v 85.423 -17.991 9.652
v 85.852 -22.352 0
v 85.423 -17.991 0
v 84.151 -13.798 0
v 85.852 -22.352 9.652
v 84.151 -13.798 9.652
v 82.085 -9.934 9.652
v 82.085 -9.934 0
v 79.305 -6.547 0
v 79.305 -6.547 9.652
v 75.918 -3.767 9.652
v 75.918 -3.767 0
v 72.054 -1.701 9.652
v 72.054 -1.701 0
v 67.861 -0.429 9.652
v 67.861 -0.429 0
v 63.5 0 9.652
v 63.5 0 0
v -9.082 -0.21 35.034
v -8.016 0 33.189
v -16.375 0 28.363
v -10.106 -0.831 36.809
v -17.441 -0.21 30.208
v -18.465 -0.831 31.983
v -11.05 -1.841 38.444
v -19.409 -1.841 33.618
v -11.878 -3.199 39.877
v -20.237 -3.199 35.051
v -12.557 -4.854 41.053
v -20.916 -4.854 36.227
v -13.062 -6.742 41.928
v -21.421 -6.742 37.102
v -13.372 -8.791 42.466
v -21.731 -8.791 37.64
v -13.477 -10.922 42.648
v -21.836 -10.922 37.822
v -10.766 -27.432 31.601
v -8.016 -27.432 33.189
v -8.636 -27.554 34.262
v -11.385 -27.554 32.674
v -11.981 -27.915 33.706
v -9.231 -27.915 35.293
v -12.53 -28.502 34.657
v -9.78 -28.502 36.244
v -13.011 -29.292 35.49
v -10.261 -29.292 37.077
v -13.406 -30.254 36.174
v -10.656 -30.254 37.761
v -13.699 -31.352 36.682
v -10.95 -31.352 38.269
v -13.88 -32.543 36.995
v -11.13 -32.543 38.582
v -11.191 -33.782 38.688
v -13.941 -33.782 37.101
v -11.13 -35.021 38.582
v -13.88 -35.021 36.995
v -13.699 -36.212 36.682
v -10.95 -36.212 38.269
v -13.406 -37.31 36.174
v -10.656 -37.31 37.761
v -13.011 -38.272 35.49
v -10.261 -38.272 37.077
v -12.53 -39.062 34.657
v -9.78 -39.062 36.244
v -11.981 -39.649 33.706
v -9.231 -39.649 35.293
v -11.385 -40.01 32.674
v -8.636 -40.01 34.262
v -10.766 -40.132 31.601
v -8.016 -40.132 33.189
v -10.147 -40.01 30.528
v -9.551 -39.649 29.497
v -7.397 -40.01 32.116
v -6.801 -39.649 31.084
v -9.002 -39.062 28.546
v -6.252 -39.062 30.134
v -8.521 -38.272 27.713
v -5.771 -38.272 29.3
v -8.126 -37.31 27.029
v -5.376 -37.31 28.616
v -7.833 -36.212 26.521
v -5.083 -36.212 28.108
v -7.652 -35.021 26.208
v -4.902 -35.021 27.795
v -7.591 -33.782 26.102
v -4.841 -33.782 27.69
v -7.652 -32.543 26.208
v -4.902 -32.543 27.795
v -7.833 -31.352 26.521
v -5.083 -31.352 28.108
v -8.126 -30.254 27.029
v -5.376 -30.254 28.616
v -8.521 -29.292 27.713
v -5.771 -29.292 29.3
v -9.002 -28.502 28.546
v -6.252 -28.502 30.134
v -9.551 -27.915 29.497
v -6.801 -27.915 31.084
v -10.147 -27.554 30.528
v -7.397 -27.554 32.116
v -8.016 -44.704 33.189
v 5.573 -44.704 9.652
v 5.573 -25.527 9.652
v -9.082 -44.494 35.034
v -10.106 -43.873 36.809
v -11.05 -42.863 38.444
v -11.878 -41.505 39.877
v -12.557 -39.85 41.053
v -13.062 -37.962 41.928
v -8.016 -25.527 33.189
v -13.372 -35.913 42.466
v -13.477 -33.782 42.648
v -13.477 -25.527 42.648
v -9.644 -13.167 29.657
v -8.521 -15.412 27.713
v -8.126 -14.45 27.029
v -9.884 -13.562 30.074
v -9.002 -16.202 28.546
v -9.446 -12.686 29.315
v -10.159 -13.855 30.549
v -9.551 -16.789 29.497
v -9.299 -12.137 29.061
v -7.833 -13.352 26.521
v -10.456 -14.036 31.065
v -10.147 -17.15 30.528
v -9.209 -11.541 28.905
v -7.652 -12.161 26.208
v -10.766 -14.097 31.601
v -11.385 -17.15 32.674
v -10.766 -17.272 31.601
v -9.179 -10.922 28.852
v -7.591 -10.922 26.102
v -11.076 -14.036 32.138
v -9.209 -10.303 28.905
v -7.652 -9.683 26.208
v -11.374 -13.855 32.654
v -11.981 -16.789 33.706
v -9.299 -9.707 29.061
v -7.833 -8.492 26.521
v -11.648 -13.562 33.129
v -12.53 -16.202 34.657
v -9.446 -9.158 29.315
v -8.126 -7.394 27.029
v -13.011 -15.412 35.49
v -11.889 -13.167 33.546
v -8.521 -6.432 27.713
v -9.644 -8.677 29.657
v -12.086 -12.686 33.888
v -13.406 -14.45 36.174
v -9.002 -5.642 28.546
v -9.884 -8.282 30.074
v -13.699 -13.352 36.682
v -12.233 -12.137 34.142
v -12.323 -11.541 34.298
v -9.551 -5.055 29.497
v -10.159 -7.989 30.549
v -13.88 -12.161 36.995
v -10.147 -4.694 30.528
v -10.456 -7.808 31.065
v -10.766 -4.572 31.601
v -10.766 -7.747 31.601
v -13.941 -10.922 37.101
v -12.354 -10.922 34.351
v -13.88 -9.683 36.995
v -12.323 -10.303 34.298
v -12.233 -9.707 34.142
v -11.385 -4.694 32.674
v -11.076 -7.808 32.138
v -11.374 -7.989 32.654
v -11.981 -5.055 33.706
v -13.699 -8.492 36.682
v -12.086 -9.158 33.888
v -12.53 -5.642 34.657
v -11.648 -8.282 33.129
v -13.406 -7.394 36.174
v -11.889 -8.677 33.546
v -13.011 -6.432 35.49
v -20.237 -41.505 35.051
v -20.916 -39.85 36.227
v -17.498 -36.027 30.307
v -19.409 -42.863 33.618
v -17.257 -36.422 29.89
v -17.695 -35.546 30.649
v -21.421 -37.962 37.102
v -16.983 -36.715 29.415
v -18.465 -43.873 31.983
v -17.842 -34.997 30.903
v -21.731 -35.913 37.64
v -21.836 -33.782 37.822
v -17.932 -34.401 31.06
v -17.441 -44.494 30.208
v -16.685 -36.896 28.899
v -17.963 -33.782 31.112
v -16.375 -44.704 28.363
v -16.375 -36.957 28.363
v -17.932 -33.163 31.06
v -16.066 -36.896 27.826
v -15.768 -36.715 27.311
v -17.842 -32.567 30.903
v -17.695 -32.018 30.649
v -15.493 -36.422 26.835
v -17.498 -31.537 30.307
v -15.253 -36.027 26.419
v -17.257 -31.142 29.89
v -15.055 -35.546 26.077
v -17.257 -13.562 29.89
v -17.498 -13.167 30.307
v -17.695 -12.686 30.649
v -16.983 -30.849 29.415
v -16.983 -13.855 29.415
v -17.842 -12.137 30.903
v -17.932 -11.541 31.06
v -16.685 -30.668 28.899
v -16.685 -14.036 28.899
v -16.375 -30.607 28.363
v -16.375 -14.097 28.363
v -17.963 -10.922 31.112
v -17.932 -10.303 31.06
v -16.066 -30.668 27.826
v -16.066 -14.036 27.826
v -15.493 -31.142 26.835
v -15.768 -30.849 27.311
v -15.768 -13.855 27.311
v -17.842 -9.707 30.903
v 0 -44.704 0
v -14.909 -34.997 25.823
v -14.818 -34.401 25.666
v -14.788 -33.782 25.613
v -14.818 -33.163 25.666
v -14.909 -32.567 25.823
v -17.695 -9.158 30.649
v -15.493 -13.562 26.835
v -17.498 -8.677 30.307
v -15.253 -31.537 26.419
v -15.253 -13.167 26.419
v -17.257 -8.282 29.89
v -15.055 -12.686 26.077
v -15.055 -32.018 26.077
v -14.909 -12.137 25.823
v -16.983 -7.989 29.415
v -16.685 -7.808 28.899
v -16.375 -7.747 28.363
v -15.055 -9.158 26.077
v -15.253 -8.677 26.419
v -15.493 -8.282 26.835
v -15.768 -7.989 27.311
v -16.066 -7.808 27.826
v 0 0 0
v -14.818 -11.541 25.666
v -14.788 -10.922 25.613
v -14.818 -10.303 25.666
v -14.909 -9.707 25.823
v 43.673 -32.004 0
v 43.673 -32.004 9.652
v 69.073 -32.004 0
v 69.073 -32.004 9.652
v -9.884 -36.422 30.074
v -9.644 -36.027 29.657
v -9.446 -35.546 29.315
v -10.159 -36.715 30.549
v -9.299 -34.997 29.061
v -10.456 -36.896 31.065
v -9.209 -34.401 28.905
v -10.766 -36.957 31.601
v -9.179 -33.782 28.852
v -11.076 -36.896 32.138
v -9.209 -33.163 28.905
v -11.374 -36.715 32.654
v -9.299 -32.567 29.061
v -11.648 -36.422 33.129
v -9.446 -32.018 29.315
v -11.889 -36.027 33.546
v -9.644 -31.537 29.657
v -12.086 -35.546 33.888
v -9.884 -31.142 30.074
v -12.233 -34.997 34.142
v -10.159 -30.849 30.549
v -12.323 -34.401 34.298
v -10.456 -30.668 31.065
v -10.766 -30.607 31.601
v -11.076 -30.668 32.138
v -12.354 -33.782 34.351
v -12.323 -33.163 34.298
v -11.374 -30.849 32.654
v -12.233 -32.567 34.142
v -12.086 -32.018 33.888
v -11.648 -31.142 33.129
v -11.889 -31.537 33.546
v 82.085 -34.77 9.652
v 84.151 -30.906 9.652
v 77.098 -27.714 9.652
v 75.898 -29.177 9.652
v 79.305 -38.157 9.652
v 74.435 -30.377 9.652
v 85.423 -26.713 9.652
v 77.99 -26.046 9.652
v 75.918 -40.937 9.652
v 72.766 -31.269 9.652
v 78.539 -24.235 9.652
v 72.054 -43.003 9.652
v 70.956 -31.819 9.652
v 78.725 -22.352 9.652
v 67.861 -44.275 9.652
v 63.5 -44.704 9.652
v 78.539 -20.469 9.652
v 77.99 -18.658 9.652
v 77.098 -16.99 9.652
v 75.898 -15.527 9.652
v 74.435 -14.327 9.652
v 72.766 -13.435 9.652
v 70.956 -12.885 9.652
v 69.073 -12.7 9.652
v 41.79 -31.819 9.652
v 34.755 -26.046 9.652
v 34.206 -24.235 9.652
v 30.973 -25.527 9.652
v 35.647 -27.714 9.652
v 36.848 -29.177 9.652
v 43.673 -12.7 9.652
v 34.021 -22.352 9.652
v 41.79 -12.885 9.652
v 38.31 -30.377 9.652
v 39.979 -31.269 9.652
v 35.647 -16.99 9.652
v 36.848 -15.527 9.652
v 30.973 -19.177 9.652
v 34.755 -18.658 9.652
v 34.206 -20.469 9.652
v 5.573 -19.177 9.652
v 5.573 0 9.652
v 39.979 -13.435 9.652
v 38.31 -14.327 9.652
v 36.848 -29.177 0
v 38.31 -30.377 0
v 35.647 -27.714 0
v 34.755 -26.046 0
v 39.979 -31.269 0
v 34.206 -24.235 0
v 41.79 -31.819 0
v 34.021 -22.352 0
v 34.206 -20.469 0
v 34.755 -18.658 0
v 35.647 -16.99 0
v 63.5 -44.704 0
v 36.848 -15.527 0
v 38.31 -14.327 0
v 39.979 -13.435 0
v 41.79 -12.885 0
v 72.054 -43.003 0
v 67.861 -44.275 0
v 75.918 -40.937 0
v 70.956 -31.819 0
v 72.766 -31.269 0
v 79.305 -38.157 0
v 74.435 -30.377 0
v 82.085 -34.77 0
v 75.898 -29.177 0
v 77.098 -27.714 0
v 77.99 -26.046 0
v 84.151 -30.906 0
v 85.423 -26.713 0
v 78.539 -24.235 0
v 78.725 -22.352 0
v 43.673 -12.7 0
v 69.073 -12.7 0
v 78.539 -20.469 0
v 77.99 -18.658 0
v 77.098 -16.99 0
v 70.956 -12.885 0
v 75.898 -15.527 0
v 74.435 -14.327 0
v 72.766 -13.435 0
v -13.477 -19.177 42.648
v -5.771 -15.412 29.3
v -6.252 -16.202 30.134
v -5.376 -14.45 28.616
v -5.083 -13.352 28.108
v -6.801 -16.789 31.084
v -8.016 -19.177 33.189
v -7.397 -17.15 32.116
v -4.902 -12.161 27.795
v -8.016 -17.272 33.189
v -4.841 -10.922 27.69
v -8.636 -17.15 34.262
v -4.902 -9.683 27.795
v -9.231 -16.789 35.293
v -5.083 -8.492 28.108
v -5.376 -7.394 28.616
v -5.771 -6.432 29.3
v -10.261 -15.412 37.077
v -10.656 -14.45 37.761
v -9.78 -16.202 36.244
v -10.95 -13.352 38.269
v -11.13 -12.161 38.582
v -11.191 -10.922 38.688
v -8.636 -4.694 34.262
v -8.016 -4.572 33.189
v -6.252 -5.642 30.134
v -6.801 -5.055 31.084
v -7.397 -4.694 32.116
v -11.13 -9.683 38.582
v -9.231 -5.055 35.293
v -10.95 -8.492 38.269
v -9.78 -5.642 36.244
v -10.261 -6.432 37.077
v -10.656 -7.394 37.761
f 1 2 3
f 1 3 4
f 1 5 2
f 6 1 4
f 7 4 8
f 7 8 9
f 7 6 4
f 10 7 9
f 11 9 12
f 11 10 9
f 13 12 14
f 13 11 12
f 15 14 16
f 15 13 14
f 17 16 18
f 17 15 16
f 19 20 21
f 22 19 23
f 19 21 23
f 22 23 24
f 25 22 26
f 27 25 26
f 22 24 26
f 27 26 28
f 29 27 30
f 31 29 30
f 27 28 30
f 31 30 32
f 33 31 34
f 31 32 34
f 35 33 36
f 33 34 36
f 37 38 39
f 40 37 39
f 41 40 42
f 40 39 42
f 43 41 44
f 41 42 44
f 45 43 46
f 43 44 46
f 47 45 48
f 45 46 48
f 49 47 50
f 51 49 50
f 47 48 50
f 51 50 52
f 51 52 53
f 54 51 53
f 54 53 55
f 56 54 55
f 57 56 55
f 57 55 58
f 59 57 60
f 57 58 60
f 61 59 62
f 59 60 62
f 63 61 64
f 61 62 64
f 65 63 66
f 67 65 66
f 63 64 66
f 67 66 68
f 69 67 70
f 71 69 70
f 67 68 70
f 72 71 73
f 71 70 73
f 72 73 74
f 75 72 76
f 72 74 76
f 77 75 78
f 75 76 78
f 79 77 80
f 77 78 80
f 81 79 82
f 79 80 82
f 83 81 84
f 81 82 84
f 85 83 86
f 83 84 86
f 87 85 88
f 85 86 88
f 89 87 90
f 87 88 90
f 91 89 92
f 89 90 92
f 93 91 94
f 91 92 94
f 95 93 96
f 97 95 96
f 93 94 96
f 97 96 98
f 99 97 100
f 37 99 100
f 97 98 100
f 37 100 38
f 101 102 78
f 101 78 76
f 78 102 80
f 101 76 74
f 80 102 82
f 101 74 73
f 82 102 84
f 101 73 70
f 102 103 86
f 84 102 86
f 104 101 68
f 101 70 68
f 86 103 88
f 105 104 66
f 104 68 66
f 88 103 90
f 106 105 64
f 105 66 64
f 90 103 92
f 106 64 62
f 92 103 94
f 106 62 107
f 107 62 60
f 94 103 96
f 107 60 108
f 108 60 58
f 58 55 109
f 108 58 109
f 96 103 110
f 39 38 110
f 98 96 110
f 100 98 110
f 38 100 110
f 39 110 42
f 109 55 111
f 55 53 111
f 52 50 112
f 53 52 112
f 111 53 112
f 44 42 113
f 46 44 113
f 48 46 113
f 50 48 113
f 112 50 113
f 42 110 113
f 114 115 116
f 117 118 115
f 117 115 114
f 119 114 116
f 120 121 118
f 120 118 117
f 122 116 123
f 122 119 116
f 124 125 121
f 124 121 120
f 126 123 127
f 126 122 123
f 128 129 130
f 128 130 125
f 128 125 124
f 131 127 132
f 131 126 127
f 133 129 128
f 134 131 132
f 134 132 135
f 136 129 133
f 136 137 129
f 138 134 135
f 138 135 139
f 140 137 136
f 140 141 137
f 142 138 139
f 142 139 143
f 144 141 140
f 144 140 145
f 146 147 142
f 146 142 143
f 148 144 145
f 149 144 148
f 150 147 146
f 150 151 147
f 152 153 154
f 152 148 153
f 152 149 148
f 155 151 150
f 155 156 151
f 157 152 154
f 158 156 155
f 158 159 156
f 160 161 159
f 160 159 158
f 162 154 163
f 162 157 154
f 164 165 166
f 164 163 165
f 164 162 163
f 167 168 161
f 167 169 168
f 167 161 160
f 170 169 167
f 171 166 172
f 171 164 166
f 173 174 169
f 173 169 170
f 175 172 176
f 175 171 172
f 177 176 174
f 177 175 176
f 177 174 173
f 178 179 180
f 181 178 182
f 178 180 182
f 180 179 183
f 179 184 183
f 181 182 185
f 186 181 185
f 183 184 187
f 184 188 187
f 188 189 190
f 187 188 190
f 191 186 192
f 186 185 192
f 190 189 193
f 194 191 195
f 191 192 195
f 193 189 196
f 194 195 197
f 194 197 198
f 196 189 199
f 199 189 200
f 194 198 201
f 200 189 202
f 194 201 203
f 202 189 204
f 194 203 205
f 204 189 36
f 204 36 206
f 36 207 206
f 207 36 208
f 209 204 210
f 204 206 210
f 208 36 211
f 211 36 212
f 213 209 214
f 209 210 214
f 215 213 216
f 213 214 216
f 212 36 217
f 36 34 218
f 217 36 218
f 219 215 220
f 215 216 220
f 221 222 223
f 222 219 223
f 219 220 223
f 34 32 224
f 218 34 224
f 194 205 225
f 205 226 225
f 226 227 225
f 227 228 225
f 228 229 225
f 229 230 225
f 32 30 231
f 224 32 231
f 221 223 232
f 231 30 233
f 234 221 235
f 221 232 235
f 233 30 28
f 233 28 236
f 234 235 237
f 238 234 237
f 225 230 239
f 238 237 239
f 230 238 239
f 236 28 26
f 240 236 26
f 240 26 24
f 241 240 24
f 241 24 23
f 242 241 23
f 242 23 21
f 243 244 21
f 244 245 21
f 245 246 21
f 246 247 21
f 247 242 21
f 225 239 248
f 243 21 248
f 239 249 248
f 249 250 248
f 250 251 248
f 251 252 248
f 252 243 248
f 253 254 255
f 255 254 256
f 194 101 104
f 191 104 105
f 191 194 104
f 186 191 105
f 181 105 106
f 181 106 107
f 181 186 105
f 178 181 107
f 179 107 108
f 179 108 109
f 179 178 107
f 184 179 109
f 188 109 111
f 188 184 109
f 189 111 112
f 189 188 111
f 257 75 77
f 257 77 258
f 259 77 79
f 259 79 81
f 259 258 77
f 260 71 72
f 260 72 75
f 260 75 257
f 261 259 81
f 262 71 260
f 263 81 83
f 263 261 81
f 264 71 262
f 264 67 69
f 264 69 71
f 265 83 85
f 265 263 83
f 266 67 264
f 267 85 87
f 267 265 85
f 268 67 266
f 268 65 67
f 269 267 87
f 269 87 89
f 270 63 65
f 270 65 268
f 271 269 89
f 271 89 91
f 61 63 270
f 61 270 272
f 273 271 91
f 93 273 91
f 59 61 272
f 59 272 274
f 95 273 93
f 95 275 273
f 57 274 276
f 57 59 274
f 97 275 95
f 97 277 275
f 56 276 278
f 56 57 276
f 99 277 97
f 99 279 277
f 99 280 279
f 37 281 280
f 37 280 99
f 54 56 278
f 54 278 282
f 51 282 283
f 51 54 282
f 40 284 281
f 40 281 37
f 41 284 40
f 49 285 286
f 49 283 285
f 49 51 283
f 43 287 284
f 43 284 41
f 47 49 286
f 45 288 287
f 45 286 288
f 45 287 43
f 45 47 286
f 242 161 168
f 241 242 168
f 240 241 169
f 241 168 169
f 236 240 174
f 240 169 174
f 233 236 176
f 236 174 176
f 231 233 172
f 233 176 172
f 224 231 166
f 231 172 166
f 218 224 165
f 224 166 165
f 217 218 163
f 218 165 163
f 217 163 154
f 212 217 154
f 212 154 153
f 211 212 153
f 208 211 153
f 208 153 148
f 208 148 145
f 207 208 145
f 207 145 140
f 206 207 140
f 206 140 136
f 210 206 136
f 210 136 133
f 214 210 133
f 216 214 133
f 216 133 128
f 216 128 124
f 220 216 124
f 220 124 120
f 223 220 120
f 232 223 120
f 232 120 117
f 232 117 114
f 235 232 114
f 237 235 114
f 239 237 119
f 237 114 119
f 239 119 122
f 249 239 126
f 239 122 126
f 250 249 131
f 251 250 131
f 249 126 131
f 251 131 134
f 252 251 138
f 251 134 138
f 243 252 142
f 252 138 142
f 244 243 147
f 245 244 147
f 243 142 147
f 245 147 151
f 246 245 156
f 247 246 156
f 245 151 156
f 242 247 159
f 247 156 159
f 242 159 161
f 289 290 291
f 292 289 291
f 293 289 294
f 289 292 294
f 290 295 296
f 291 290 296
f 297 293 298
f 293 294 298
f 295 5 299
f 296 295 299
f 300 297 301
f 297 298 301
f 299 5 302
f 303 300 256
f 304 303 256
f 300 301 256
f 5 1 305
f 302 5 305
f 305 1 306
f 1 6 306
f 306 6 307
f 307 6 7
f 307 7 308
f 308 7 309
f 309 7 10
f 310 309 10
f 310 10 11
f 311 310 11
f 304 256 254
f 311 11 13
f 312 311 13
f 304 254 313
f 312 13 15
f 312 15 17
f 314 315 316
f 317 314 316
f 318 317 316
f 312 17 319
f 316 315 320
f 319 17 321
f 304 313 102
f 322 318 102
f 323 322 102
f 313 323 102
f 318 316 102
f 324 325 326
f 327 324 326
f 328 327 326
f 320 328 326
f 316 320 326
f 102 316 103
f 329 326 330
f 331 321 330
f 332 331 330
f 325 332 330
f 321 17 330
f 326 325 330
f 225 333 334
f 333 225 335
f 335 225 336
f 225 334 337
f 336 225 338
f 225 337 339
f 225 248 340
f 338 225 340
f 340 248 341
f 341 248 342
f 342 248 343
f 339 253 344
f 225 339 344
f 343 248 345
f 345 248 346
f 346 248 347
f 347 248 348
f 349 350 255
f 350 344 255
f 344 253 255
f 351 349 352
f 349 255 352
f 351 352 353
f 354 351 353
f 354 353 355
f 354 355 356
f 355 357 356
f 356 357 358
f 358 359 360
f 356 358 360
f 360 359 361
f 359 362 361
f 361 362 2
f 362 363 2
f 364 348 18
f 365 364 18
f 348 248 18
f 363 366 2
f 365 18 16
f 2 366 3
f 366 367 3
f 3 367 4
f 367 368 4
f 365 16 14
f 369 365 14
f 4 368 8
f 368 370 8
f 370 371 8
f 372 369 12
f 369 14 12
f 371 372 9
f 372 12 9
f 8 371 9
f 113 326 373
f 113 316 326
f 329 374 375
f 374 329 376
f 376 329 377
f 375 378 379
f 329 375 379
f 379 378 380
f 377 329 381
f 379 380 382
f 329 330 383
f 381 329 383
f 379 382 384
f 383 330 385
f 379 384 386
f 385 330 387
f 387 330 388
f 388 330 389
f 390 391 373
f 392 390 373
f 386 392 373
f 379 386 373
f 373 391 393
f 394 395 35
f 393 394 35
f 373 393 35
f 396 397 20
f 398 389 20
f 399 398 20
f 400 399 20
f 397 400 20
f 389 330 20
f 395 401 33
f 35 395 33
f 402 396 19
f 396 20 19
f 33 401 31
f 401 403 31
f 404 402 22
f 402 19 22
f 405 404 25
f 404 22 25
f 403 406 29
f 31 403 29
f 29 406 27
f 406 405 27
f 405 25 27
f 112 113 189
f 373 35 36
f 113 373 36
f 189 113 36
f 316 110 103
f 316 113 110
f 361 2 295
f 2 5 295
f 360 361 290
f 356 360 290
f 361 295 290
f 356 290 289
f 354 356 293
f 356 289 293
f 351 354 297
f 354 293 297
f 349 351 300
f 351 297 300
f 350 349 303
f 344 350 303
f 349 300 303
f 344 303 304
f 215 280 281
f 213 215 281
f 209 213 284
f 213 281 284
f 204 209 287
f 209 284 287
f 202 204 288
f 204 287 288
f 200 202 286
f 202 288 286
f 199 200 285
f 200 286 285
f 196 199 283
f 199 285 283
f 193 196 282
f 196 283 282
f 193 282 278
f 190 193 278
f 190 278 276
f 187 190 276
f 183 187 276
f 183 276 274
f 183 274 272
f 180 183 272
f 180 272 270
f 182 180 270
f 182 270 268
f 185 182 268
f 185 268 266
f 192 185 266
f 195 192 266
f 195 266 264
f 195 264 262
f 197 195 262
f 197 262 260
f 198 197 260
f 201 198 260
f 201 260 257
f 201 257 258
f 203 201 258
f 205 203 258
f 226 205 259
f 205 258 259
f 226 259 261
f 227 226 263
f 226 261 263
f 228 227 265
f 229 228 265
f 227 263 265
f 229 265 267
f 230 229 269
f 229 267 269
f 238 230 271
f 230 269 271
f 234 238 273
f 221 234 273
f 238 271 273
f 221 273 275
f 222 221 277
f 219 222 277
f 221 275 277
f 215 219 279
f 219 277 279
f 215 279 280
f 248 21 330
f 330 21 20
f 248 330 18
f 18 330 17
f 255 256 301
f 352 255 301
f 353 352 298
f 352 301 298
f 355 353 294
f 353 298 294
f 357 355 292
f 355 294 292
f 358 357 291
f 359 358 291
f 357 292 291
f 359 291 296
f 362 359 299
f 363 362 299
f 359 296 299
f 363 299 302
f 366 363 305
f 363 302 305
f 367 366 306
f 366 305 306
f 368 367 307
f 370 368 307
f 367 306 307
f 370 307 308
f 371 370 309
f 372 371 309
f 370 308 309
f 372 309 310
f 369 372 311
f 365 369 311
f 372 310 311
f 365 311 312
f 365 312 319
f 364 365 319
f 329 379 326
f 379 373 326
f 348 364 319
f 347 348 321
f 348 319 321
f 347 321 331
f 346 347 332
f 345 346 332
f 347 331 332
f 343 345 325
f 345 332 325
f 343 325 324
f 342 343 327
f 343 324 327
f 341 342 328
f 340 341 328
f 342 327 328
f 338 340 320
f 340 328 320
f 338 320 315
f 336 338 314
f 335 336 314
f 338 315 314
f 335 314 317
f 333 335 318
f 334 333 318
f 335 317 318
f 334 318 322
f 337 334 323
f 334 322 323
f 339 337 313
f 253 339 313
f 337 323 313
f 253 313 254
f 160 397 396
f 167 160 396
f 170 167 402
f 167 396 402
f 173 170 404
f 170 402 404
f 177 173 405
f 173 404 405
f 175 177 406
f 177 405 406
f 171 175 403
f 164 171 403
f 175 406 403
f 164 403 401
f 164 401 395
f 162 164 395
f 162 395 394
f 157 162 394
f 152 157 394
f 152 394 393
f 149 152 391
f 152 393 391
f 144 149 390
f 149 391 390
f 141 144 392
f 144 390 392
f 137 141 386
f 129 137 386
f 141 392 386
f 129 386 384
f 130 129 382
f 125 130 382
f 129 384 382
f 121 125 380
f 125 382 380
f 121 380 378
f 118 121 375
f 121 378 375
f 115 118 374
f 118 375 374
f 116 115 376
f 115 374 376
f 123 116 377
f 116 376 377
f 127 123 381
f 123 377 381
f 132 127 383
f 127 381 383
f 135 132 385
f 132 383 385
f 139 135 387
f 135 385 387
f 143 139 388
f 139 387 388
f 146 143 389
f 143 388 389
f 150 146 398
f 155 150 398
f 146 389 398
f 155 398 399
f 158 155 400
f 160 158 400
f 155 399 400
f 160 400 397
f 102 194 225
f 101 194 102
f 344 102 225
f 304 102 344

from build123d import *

# Parameters (mm, degrees)
F1_DEPTH  = 44.704
F3_R      = 22.35199
F5_R      = 10.922
F4_R      = 3.175
F6_DEPTH  = 28.5637839421
F4_R_2    = 6.35
F7_DEPTH  = 3.175
F8_DEPTH  = 9.653
F11_DEPTH = 3.175


# Not quite as in the source:
# - a fillet or chamfer is up to 0.001 mm smaller than in the source, because OpenCascade refuses the exact size


with BuildPart() as f1:
    # F0 (on Front) → F1 (new body)
    with BuildSketch(Plane.XZ):
        Polygon((-21.8362923991, 37.8215678842), (0, 0), (85.852, 0), (85.852, 9.652), (30.9725847982, 9.652), (5.5725847982, 9.652), (-13.4774152018, 42.6475678842), align=None)
    extrude(amount=F1_DEPTH)

    # F3 (radius 22.352 in the source; OpenCascade refuses exactly that, so slightly less here)
    f3_edges = [f1.edges().sort_by_distance(p)[0] for p in [
        (85.852, -44.704, 4.826),
        (85.852, 0, 4.826),
    ]]
    fillet(f3_edges, radius=F3_R)

    # F5
    f5_edges = [f1.edges().sort_by_distance(p)[0] for p in [
        (-17.656854, -44.704, 40.234568),
        (-17.656854, 0, 40.234568),
    ]]
    fillet(f5_edges, radius=F5_R)

    # F4 (on face) → F6 (cut, through all)
    with BuildSketch(Plane(origin=(8.3588771973, 0, 4.826), x_dir=(0, 1, 0), z_dir=(0.8660254038, 0, 0.5))):
        with Locations((-33.782, 32.7505847982)):
            Circle(F4_R)
        with Locations((-10.922, 32.7505847982)):
            Circle(F4_R)
    extrude(amount=-F6_DEPTH, mode=Mode.SUBTRACT)

    # F4 (on face) → F7 (cut)
    with BuildSketch(Plane(origin=(8.3588771973, 0, 4.826), x_dir=(0, 1, 0), z_dir=(0.8660254038, 0, 0.5))):
        with Locations((-33.782, 32.7505847982)):
            Circle(F4_R_2)
        with Locations((-33.782, 32.7505847982)):
            Circle(F4_R, mode=Mode.SUBTRACT)
        with Locations((-10.922, 32.7505847982)):
            Circle(F4_R_2)
        with Locations((-10.922, 32.7505847982)):
            Circle(F4_R, mode=Mode.SUBTRACT)
    extrude(amount=-F7_DEPTH, mode=Mode.SUBTRACT)

    # F2 (on face) → F8 (cut, through all)
    with BuildSketch(Plane.XY.offset(9.652)):
        with BuildLine():
            Line((43.6725847982, -32.004), (69.0725847982, -32.004))
            ThreePointArc((69.0725847982, -32.004), (78.7245847982, -22.352), (69.0725847982, -12.7))
            Line((69.0725847982, -12.7), (43.6725847982, -12.7))
            ThreePointArc((43.6725847982, -12.7), (34.0205847982, -22.352), (43.6725847982, -32.004))
        make_face()
    extrude(amount=-F8_DEPTH, mode=Mode.SUBTRACT)

    # F10 (on offset) → F11 (join, symmetric)
    with BuildSketch(Plane.XZ.offset(22.352)):
        Polygon((30.9725847982, 9.652), (-13.4774152018, 42.6475678842), (-8.0164152018, 33.1888384241), (5.5725847982, 9.652), align=None)
    extrude(amount=F11_DEPTH, both=True)


solid = f1.part
